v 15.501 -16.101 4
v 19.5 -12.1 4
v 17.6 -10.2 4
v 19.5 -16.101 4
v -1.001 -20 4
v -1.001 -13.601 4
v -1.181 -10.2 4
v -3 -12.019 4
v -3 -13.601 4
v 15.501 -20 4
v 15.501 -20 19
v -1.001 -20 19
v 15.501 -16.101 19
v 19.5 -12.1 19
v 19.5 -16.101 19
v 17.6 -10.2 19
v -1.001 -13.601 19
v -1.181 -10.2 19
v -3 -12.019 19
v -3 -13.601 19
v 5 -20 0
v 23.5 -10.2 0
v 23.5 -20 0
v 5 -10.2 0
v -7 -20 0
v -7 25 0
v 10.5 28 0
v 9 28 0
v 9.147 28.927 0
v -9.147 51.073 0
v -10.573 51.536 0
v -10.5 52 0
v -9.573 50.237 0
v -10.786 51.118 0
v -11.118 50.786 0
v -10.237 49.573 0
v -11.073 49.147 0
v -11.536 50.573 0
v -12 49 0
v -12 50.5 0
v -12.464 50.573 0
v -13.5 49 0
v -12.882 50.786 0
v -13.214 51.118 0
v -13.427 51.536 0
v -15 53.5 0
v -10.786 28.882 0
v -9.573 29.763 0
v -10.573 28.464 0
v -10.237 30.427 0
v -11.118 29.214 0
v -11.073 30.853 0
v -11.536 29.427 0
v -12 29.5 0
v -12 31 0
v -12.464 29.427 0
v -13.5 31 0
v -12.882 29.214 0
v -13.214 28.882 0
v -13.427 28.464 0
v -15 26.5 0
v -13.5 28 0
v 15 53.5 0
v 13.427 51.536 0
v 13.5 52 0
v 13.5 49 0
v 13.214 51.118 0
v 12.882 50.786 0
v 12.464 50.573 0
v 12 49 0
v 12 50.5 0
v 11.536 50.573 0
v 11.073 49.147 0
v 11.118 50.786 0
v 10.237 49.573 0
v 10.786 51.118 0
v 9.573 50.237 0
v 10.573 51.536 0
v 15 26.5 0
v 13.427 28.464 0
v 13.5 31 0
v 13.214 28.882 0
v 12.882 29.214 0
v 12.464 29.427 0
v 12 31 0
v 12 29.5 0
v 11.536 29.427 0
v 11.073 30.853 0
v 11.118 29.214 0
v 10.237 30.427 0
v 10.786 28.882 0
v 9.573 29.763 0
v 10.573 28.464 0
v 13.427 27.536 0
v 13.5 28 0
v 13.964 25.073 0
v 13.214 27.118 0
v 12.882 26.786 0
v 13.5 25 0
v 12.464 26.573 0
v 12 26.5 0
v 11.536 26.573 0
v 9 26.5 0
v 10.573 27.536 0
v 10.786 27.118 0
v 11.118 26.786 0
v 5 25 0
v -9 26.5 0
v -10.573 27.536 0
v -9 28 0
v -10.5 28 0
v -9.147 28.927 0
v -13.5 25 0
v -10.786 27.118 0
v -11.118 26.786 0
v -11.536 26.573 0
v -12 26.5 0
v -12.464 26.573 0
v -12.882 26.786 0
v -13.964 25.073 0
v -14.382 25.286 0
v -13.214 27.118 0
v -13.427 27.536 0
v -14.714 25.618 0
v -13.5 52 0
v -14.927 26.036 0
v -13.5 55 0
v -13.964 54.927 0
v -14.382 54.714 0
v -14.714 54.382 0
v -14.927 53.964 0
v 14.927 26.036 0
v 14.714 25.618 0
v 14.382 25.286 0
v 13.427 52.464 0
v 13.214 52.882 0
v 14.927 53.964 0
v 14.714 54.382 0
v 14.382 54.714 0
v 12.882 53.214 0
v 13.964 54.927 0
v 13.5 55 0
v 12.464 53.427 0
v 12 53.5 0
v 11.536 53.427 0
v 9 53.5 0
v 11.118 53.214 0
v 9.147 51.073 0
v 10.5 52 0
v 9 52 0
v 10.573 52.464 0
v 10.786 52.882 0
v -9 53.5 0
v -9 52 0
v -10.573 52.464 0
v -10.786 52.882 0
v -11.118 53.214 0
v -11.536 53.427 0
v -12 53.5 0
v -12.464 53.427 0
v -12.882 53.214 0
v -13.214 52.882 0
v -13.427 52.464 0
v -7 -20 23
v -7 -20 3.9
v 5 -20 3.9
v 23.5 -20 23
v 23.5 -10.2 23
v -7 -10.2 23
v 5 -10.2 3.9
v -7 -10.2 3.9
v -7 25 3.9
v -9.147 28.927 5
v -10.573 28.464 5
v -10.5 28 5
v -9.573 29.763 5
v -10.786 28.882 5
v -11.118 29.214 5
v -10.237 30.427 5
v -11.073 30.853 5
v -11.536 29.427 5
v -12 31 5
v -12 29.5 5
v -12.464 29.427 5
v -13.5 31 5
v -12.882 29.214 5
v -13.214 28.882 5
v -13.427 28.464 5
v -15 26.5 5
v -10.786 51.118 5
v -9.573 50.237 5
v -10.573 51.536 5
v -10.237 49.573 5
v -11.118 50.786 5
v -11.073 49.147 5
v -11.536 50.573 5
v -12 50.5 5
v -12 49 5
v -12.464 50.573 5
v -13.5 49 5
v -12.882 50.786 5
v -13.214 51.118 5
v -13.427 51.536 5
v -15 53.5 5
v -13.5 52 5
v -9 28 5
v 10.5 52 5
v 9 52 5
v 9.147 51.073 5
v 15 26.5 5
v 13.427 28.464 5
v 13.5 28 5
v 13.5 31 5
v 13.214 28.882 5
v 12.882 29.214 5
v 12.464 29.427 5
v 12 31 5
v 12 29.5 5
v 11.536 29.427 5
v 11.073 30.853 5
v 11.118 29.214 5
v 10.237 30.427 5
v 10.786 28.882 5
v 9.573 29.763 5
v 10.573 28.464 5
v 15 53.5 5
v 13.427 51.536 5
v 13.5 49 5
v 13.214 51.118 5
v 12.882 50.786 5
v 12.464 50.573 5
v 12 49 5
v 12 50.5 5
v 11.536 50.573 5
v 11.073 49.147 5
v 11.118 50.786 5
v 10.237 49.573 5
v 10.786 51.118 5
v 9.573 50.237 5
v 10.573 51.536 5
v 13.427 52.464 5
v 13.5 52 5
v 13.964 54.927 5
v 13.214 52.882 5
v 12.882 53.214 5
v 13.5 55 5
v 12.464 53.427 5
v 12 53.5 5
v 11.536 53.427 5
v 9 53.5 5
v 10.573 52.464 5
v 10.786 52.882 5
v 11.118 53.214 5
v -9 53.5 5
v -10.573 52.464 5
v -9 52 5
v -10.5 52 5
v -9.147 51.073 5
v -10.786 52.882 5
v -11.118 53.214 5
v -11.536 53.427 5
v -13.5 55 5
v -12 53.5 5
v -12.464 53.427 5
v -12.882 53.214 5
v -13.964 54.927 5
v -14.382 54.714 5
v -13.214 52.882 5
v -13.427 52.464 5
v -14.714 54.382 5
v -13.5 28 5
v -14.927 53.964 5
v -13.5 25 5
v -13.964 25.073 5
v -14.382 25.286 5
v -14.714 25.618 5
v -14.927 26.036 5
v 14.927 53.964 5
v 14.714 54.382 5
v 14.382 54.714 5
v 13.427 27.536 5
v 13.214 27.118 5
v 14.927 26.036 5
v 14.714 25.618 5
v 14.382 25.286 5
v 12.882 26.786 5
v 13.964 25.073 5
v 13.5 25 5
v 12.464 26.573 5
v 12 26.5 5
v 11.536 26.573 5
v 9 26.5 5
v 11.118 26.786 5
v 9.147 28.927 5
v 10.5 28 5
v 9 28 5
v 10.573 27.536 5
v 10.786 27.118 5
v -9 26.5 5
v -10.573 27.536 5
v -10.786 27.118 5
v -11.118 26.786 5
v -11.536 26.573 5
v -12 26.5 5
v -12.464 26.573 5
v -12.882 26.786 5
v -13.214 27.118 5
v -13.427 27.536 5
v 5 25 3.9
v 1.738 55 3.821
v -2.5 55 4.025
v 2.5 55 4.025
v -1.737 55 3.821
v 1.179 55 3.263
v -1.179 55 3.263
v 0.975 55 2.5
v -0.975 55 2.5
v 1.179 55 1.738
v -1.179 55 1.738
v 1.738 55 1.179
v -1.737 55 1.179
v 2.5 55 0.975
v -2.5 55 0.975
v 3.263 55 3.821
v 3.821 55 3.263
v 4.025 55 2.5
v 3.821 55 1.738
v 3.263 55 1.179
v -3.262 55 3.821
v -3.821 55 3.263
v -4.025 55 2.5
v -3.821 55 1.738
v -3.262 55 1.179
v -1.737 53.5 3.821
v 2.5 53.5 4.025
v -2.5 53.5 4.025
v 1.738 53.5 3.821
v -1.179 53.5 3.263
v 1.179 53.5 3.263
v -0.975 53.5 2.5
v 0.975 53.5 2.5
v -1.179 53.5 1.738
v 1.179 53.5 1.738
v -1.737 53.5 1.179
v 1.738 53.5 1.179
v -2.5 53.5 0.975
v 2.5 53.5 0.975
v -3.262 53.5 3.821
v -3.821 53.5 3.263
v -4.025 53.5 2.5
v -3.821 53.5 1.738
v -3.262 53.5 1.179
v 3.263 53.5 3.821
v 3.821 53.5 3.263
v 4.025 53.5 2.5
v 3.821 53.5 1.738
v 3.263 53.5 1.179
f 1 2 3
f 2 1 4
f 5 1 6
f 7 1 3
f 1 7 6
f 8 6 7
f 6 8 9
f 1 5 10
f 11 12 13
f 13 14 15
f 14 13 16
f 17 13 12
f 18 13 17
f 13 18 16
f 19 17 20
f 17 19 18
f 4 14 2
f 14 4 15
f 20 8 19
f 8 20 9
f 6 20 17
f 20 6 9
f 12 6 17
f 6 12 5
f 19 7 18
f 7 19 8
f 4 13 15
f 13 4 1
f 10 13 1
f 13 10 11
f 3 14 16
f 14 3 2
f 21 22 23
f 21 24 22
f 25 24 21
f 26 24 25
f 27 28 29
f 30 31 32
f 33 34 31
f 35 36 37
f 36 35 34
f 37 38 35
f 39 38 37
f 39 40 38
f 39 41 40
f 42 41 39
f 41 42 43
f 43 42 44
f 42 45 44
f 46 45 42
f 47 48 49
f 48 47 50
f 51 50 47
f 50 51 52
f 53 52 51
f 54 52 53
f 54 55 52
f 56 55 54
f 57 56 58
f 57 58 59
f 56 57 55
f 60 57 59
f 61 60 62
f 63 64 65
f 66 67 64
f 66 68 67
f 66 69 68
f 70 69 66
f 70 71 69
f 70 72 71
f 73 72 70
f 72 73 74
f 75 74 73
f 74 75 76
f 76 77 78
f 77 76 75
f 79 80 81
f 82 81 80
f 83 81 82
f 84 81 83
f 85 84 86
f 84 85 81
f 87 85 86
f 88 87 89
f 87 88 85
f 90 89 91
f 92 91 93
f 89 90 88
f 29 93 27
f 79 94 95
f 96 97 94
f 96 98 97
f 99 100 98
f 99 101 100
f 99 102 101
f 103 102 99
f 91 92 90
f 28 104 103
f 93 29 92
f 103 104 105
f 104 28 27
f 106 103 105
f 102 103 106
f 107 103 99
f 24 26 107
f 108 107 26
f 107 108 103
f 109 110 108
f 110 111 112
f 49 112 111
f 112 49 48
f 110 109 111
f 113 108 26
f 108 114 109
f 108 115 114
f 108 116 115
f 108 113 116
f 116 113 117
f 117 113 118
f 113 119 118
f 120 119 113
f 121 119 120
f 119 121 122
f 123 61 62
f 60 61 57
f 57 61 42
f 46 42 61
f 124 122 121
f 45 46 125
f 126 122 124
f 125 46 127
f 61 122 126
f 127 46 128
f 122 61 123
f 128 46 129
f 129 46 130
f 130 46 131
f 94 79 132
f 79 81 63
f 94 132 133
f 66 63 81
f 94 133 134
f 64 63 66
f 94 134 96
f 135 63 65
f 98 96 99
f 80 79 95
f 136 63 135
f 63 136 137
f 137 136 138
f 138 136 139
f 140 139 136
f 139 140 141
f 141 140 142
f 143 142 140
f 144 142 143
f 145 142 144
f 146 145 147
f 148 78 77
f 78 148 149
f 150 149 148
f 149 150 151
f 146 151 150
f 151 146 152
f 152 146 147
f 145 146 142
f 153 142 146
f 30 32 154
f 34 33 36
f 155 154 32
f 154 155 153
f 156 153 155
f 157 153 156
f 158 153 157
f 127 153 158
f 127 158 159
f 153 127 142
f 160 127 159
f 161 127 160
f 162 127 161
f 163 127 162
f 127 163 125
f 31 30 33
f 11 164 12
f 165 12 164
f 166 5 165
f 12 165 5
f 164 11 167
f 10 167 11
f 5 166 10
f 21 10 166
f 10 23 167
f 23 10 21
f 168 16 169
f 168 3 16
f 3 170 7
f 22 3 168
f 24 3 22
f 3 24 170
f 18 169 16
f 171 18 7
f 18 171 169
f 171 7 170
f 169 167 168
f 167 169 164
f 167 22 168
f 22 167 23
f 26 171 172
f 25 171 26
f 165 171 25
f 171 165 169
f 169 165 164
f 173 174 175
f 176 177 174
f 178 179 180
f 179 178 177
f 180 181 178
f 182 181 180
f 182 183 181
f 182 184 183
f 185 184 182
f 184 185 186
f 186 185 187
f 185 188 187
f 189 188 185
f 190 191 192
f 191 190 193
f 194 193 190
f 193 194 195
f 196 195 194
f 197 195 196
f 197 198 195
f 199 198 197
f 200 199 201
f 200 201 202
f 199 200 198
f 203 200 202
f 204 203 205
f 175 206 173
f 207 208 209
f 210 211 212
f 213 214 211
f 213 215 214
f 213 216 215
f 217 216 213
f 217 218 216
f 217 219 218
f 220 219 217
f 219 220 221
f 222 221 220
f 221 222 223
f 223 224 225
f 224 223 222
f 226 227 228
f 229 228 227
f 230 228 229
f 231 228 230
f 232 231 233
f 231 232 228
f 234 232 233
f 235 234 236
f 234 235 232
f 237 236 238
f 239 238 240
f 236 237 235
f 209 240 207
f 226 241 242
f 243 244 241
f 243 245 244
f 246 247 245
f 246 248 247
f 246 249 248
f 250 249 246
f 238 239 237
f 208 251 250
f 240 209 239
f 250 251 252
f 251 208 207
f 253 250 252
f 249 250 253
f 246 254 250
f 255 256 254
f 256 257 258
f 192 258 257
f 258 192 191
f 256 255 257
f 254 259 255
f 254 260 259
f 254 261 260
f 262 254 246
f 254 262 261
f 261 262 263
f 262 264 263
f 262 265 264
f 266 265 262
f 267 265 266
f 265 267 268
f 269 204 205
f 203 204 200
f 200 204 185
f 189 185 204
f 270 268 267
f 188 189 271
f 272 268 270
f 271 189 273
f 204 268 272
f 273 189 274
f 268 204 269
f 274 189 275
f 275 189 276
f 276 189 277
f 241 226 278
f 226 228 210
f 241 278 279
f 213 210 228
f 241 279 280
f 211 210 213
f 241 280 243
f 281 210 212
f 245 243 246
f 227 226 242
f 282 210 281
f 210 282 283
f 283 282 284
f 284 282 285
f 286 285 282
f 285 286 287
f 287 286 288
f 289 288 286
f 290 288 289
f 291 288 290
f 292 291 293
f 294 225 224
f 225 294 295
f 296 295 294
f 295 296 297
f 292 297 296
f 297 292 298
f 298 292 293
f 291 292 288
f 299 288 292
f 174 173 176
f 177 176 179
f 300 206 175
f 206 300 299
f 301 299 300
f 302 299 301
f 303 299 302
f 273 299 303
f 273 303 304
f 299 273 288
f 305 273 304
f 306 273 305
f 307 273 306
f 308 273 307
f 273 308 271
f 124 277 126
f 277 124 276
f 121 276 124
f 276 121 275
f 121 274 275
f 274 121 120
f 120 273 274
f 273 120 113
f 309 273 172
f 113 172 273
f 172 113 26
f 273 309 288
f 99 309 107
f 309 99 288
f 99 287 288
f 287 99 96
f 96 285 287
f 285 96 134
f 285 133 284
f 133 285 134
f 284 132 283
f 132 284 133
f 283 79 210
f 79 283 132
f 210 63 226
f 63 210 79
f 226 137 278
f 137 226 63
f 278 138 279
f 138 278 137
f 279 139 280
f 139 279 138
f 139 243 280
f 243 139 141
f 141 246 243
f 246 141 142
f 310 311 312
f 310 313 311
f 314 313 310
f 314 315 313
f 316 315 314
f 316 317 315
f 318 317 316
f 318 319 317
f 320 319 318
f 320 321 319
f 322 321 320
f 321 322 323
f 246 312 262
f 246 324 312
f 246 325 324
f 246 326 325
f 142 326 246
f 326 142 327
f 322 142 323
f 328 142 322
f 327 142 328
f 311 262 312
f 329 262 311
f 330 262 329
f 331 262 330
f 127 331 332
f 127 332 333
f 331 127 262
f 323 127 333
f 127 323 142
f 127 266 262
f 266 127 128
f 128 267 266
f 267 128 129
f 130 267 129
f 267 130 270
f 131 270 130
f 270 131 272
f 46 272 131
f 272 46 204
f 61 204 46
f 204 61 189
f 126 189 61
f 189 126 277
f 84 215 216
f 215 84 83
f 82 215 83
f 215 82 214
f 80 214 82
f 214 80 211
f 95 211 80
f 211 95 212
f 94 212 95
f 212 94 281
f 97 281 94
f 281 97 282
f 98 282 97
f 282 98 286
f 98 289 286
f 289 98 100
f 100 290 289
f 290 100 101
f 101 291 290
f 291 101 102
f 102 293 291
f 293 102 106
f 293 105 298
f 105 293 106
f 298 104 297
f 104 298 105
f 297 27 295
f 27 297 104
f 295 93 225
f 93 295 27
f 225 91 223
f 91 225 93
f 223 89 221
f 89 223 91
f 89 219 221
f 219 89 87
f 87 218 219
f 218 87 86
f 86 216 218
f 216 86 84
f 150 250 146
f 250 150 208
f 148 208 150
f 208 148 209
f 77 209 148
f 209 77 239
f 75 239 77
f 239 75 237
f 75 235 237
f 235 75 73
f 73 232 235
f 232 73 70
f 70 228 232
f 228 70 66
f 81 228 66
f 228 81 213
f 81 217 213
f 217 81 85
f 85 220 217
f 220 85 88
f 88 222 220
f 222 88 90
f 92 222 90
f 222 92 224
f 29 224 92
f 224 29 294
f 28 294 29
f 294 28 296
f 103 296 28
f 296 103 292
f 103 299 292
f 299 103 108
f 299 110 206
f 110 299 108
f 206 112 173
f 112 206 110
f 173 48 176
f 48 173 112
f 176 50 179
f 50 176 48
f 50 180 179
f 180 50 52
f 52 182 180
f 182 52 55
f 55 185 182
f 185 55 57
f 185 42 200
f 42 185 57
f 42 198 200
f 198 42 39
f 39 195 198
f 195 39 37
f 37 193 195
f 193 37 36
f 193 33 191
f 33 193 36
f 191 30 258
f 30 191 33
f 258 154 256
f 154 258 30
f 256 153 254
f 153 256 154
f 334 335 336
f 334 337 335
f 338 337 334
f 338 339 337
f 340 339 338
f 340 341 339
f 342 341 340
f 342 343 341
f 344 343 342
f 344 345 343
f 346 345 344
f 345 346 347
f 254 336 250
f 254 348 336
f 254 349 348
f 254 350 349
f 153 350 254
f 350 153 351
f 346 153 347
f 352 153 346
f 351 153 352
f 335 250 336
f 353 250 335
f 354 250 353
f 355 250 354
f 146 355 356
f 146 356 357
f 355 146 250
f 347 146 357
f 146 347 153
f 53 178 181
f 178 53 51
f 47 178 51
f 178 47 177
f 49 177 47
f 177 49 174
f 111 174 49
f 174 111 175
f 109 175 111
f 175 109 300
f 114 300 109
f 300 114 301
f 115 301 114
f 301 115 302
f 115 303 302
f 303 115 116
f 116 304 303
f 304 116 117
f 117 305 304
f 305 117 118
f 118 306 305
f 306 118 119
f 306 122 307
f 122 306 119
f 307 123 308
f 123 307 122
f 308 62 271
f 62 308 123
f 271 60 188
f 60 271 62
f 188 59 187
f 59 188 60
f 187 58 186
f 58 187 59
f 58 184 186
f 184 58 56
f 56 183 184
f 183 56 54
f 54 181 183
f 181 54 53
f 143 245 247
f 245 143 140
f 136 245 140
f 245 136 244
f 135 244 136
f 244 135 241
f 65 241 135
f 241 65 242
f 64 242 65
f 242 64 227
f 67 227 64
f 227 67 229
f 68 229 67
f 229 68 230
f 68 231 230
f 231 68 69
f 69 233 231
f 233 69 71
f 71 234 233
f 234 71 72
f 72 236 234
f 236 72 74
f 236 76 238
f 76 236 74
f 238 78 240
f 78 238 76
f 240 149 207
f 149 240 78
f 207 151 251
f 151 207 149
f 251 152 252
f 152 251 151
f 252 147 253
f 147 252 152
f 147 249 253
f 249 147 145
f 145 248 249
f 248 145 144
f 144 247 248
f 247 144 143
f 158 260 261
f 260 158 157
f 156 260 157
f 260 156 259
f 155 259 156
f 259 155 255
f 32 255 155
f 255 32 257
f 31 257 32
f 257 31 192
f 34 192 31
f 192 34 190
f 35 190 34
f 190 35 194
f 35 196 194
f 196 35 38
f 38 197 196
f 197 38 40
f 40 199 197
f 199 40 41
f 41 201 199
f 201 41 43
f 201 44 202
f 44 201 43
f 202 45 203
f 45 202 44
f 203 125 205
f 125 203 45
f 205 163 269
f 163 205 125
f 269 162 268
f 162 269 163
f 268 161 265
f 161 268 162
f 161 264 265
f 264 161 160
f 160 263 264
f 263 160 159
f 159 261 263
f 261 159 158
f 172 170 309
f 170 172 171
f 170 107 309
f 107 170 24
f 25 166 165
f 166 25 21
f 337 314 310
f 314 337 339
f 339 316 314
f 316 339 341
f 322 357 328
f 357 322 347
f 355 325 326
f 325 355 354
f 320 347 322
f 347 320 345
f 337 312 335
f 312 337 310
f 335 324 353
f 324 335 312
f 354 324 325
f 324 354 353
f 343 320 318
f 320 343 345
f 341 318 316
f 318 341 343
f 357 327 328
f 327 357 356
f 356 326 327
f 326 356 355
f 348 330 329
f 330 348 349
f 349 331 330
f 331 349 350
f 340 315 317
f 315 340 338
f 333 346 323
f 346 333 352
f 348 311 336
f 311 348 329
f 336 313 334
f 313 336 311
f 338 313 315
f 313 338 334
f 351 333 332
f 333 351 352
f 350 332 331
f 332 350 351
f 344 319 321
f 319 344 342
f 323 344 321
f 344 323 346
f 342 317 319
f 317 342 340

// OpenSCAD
// file: keystone.scad
module keystone()
{
rotate([0,0,90]) {
	difference(){
	  translate([0,0,.1]) cube([23,30.5,9.8]);
	  translate([4,4,0]){
		difference(){
	 	 cube([15,22.5,10]);
	       	 translate([-1,-0.001,3.501]) cube([17,2,6.5]);
	    	 translate([-1,2.5,-3.40970]) rotate([45,0,0]) cube([17,2,6.5]);
		 translate([-1,18.501,6.001]) cube([17,4,4]);
	    	 translate([-1,20.5,0]) rotate([-45,0,0]) cube([17,2,6.5]);
 		 }
		}
    	      }
	}


}

//keystone();
// file: fan_mount.scad
/*
OPENSCAD Library file by the DoomMeister
Mounting surround for small DC fans (25 - 120mm)

Data taken from various places around the internet.
http://www.qwikflow.com/dc_fans.html

//Released under the terms of the GNU GPL v3.0
This program is free software: you can redistribute it and/or modify
it under the terms of the GNU General Public License as published by
the Free Software Foundation, either version 3 of the License, or
(at your option) any later version.

This program is distributed in the hope that it will be useful,
but WITHOUT ANY WARRANTY; without even the implied warranty of
MERCHANTABILITY or FITNESS FOR A PARTICULAR PURPOSE. See the
GNU General Public License for more details.

You should have received a copy of the GNU General Public License
along with this program. If not, see <http://www.gnu.org/licenses/>.
*/

//uncomment this for example
//fan_mount(size=60,thick=3);

module fan_mount(size=40,thick = 4)
{
if(size == 25)
	{
	_fan_mount(
			fan_size = 25,
			fan_mounting_pitch = 20,
			fan_m_hole_dia = 3,
			holder_thickness = thick
		 );
	}
if(size == 30)
	{
	_fan_mount(
			fan_size = 30,
			fan_mounting_pitch = 24,
			fan_m_hole_dia = 3,
			holder_thickness = thick
		 );
	}

if(size == 40)
	{
	_fan_mount(
			fan_size = 40,
			fan_mounting_pitch = 32,
			fan_m_hole_dia = 3.5,
			holder_thickness = thick
		 );
	}
if(size == 45)
	{
	_fan_mount(
			fan_size = 45,
			fan_mounting_pitch = 37,
			fan_m_hole_dia = 4.3,
			holder_thickness = thick
		 );
	}
if(size == 60)
	{
	_fan_mount(
			fan_size = 60,
			fan_mounting_pitch = 50,
			fan_m_hole_dia = 4.4,
			holder_thickness = thick
		 );
	}
if(size == 80)
	{
	_fan_mount(
			fan_size = 80,
			fan_mounting_pitch = 71.5,
			fan_m_hole_dia = 4.4,
			holder_thickness = thick
		 );
	}

if(size == 120)
	{
	_fan_mount(
			fan_size = 120,
			fan_mounting_pitch = 105,
			fan_m_hole_dia = 4.4,
			holder_thickness = thick
		 );
	}
}


//inner module
module _fan_mount(
			fan_size, //nominsl size of fan
			fan_mounting_pitch, //pitch between mounting holes
			fan_m_hole_dia, //mounting hole diameter
			holder_thickness //user defined thickness
		 )
{

offset1 = (fan_size-(fan_mounting_pitch + fan_m_hole_dia))/2;
offset2 = (fan_size-(fan_mounting_pitch))/2;
offset3 = offset2 + fan_mounting_pitch;
thickness = (fan_size-fan_mounting_pitch)/2;	
			
			//difference()
			//{
			linear_extrude(height = holder_thickness)
			union()
			{	
			difference()
			{
				translate([fan_m_hole_dia/2,fan_m_hole_dia/2,0])
				minkowski()
				{	
					square([fan_size - fan_m_hole_dia,fan_size - fan_m_hole_dia]);
					circle(r= fan_m_hole_dia/2, $fn=20);
				}
			
					translate([offset1,offset1,0])
					square([fan_mounting_pitch + fan_m_hole_dia,fan_mounting_pitch + fan_m_hole_dia]);
				}
				translate([offset2,offset2,0])
				rotate([0,0,0])_corner_hole();
				translate([offset3,offset2,0])
				rotate([0,0,90])_corner_hole();
				translate([offset2,offset3,0])
				rotate([0,0,90])_corner_hole();
				translate([offset3,offset3,0])
				rotate([0,0,0])_corner_hole();
			}

module _corner_hole()
{
				difference(){
					union(){
							difference(){
							square([fan_m_hole_dia + thickness,fan_m_hole_dia + thickness],center=true);
							square([(fan_m_hole_dia + thickness)/2,(fan_m_hole_dia + thickness)/2],center=false);
							translate([-(fan_m_hole_dia + thickness)/2,-(fan_m_hole_dia + thickness)/2])
							square([(fan_m_hole_dia + thickness)/2,(fan_m_hole_dia + thickness)/2],center=false);
							}
					circle(r=(fan_m_hole_dia + thickness)/2, $fn=20);
					}
					circle(r=(fan_m_hole_dia)/2, $fn=20);
				}
}


echo(offset1,offset2,thickness);
}
// file: configuration.scad
// Increase this if your slicer or printer make holes too tight.
extra_radius = 0.1;

// OD = outside diameter, corner to corner.
m3_nut_od = 6.1;
m3_nut_radius = m3_nut_od/2 + 0.2 + extra_radius;

// Major diameter of metric 3mm thread.
m3_major = 2.85;
m3_radius = m3_major/2 + extra_radius;
m3_wide_radius = m3_major/2 + extra_radius + 0.2;

// NEMA17 stepper motors.
motor_shaft_diameter = 5;
motor_shaft_radius = motor_shaft_diameter/2 + extra_radius;

// Frame brackets. M3x8mm screws work best with 3.6 mm brackets.
thickness = 3.6;

// OpenBeam or Misumi. Currently only 15x15 mm, but there is a plan
// to make models more parametric and allow 20x20 mm in the future.
extrusion = 15;
// main file
include <configuration.scad>;
include <fan_mount.scad>;
include <keystone.scad>;



module fan_mount_body()
{
	union(){
       translate([ 0,0,-5]) fan_mount(size=30,thick=5);
       translate([10,30,-5])  cube([12,45,3.9]);
       translate([22,65.1,18]) rotate([90,180,180]) keystone();
       }

}

module fan_mount_cuts()
{

     translate([12.5,0,-2.5]) rotate([90,0,0])
        cylinder(r=m3_radius, h=5, center=true, $fn=12);
     translate([17.5,0,-2.5]) rotate([90,0,0])
        cylinder(r=m3_radius, h=5, center=true, $fn=12);

}

module fanmount()
{
    difference(){
       fan_mount_body();
       fan_mount_cuts();
       }
}


translate([15,55,5]) rotate([0,0,180]) fanmount();
